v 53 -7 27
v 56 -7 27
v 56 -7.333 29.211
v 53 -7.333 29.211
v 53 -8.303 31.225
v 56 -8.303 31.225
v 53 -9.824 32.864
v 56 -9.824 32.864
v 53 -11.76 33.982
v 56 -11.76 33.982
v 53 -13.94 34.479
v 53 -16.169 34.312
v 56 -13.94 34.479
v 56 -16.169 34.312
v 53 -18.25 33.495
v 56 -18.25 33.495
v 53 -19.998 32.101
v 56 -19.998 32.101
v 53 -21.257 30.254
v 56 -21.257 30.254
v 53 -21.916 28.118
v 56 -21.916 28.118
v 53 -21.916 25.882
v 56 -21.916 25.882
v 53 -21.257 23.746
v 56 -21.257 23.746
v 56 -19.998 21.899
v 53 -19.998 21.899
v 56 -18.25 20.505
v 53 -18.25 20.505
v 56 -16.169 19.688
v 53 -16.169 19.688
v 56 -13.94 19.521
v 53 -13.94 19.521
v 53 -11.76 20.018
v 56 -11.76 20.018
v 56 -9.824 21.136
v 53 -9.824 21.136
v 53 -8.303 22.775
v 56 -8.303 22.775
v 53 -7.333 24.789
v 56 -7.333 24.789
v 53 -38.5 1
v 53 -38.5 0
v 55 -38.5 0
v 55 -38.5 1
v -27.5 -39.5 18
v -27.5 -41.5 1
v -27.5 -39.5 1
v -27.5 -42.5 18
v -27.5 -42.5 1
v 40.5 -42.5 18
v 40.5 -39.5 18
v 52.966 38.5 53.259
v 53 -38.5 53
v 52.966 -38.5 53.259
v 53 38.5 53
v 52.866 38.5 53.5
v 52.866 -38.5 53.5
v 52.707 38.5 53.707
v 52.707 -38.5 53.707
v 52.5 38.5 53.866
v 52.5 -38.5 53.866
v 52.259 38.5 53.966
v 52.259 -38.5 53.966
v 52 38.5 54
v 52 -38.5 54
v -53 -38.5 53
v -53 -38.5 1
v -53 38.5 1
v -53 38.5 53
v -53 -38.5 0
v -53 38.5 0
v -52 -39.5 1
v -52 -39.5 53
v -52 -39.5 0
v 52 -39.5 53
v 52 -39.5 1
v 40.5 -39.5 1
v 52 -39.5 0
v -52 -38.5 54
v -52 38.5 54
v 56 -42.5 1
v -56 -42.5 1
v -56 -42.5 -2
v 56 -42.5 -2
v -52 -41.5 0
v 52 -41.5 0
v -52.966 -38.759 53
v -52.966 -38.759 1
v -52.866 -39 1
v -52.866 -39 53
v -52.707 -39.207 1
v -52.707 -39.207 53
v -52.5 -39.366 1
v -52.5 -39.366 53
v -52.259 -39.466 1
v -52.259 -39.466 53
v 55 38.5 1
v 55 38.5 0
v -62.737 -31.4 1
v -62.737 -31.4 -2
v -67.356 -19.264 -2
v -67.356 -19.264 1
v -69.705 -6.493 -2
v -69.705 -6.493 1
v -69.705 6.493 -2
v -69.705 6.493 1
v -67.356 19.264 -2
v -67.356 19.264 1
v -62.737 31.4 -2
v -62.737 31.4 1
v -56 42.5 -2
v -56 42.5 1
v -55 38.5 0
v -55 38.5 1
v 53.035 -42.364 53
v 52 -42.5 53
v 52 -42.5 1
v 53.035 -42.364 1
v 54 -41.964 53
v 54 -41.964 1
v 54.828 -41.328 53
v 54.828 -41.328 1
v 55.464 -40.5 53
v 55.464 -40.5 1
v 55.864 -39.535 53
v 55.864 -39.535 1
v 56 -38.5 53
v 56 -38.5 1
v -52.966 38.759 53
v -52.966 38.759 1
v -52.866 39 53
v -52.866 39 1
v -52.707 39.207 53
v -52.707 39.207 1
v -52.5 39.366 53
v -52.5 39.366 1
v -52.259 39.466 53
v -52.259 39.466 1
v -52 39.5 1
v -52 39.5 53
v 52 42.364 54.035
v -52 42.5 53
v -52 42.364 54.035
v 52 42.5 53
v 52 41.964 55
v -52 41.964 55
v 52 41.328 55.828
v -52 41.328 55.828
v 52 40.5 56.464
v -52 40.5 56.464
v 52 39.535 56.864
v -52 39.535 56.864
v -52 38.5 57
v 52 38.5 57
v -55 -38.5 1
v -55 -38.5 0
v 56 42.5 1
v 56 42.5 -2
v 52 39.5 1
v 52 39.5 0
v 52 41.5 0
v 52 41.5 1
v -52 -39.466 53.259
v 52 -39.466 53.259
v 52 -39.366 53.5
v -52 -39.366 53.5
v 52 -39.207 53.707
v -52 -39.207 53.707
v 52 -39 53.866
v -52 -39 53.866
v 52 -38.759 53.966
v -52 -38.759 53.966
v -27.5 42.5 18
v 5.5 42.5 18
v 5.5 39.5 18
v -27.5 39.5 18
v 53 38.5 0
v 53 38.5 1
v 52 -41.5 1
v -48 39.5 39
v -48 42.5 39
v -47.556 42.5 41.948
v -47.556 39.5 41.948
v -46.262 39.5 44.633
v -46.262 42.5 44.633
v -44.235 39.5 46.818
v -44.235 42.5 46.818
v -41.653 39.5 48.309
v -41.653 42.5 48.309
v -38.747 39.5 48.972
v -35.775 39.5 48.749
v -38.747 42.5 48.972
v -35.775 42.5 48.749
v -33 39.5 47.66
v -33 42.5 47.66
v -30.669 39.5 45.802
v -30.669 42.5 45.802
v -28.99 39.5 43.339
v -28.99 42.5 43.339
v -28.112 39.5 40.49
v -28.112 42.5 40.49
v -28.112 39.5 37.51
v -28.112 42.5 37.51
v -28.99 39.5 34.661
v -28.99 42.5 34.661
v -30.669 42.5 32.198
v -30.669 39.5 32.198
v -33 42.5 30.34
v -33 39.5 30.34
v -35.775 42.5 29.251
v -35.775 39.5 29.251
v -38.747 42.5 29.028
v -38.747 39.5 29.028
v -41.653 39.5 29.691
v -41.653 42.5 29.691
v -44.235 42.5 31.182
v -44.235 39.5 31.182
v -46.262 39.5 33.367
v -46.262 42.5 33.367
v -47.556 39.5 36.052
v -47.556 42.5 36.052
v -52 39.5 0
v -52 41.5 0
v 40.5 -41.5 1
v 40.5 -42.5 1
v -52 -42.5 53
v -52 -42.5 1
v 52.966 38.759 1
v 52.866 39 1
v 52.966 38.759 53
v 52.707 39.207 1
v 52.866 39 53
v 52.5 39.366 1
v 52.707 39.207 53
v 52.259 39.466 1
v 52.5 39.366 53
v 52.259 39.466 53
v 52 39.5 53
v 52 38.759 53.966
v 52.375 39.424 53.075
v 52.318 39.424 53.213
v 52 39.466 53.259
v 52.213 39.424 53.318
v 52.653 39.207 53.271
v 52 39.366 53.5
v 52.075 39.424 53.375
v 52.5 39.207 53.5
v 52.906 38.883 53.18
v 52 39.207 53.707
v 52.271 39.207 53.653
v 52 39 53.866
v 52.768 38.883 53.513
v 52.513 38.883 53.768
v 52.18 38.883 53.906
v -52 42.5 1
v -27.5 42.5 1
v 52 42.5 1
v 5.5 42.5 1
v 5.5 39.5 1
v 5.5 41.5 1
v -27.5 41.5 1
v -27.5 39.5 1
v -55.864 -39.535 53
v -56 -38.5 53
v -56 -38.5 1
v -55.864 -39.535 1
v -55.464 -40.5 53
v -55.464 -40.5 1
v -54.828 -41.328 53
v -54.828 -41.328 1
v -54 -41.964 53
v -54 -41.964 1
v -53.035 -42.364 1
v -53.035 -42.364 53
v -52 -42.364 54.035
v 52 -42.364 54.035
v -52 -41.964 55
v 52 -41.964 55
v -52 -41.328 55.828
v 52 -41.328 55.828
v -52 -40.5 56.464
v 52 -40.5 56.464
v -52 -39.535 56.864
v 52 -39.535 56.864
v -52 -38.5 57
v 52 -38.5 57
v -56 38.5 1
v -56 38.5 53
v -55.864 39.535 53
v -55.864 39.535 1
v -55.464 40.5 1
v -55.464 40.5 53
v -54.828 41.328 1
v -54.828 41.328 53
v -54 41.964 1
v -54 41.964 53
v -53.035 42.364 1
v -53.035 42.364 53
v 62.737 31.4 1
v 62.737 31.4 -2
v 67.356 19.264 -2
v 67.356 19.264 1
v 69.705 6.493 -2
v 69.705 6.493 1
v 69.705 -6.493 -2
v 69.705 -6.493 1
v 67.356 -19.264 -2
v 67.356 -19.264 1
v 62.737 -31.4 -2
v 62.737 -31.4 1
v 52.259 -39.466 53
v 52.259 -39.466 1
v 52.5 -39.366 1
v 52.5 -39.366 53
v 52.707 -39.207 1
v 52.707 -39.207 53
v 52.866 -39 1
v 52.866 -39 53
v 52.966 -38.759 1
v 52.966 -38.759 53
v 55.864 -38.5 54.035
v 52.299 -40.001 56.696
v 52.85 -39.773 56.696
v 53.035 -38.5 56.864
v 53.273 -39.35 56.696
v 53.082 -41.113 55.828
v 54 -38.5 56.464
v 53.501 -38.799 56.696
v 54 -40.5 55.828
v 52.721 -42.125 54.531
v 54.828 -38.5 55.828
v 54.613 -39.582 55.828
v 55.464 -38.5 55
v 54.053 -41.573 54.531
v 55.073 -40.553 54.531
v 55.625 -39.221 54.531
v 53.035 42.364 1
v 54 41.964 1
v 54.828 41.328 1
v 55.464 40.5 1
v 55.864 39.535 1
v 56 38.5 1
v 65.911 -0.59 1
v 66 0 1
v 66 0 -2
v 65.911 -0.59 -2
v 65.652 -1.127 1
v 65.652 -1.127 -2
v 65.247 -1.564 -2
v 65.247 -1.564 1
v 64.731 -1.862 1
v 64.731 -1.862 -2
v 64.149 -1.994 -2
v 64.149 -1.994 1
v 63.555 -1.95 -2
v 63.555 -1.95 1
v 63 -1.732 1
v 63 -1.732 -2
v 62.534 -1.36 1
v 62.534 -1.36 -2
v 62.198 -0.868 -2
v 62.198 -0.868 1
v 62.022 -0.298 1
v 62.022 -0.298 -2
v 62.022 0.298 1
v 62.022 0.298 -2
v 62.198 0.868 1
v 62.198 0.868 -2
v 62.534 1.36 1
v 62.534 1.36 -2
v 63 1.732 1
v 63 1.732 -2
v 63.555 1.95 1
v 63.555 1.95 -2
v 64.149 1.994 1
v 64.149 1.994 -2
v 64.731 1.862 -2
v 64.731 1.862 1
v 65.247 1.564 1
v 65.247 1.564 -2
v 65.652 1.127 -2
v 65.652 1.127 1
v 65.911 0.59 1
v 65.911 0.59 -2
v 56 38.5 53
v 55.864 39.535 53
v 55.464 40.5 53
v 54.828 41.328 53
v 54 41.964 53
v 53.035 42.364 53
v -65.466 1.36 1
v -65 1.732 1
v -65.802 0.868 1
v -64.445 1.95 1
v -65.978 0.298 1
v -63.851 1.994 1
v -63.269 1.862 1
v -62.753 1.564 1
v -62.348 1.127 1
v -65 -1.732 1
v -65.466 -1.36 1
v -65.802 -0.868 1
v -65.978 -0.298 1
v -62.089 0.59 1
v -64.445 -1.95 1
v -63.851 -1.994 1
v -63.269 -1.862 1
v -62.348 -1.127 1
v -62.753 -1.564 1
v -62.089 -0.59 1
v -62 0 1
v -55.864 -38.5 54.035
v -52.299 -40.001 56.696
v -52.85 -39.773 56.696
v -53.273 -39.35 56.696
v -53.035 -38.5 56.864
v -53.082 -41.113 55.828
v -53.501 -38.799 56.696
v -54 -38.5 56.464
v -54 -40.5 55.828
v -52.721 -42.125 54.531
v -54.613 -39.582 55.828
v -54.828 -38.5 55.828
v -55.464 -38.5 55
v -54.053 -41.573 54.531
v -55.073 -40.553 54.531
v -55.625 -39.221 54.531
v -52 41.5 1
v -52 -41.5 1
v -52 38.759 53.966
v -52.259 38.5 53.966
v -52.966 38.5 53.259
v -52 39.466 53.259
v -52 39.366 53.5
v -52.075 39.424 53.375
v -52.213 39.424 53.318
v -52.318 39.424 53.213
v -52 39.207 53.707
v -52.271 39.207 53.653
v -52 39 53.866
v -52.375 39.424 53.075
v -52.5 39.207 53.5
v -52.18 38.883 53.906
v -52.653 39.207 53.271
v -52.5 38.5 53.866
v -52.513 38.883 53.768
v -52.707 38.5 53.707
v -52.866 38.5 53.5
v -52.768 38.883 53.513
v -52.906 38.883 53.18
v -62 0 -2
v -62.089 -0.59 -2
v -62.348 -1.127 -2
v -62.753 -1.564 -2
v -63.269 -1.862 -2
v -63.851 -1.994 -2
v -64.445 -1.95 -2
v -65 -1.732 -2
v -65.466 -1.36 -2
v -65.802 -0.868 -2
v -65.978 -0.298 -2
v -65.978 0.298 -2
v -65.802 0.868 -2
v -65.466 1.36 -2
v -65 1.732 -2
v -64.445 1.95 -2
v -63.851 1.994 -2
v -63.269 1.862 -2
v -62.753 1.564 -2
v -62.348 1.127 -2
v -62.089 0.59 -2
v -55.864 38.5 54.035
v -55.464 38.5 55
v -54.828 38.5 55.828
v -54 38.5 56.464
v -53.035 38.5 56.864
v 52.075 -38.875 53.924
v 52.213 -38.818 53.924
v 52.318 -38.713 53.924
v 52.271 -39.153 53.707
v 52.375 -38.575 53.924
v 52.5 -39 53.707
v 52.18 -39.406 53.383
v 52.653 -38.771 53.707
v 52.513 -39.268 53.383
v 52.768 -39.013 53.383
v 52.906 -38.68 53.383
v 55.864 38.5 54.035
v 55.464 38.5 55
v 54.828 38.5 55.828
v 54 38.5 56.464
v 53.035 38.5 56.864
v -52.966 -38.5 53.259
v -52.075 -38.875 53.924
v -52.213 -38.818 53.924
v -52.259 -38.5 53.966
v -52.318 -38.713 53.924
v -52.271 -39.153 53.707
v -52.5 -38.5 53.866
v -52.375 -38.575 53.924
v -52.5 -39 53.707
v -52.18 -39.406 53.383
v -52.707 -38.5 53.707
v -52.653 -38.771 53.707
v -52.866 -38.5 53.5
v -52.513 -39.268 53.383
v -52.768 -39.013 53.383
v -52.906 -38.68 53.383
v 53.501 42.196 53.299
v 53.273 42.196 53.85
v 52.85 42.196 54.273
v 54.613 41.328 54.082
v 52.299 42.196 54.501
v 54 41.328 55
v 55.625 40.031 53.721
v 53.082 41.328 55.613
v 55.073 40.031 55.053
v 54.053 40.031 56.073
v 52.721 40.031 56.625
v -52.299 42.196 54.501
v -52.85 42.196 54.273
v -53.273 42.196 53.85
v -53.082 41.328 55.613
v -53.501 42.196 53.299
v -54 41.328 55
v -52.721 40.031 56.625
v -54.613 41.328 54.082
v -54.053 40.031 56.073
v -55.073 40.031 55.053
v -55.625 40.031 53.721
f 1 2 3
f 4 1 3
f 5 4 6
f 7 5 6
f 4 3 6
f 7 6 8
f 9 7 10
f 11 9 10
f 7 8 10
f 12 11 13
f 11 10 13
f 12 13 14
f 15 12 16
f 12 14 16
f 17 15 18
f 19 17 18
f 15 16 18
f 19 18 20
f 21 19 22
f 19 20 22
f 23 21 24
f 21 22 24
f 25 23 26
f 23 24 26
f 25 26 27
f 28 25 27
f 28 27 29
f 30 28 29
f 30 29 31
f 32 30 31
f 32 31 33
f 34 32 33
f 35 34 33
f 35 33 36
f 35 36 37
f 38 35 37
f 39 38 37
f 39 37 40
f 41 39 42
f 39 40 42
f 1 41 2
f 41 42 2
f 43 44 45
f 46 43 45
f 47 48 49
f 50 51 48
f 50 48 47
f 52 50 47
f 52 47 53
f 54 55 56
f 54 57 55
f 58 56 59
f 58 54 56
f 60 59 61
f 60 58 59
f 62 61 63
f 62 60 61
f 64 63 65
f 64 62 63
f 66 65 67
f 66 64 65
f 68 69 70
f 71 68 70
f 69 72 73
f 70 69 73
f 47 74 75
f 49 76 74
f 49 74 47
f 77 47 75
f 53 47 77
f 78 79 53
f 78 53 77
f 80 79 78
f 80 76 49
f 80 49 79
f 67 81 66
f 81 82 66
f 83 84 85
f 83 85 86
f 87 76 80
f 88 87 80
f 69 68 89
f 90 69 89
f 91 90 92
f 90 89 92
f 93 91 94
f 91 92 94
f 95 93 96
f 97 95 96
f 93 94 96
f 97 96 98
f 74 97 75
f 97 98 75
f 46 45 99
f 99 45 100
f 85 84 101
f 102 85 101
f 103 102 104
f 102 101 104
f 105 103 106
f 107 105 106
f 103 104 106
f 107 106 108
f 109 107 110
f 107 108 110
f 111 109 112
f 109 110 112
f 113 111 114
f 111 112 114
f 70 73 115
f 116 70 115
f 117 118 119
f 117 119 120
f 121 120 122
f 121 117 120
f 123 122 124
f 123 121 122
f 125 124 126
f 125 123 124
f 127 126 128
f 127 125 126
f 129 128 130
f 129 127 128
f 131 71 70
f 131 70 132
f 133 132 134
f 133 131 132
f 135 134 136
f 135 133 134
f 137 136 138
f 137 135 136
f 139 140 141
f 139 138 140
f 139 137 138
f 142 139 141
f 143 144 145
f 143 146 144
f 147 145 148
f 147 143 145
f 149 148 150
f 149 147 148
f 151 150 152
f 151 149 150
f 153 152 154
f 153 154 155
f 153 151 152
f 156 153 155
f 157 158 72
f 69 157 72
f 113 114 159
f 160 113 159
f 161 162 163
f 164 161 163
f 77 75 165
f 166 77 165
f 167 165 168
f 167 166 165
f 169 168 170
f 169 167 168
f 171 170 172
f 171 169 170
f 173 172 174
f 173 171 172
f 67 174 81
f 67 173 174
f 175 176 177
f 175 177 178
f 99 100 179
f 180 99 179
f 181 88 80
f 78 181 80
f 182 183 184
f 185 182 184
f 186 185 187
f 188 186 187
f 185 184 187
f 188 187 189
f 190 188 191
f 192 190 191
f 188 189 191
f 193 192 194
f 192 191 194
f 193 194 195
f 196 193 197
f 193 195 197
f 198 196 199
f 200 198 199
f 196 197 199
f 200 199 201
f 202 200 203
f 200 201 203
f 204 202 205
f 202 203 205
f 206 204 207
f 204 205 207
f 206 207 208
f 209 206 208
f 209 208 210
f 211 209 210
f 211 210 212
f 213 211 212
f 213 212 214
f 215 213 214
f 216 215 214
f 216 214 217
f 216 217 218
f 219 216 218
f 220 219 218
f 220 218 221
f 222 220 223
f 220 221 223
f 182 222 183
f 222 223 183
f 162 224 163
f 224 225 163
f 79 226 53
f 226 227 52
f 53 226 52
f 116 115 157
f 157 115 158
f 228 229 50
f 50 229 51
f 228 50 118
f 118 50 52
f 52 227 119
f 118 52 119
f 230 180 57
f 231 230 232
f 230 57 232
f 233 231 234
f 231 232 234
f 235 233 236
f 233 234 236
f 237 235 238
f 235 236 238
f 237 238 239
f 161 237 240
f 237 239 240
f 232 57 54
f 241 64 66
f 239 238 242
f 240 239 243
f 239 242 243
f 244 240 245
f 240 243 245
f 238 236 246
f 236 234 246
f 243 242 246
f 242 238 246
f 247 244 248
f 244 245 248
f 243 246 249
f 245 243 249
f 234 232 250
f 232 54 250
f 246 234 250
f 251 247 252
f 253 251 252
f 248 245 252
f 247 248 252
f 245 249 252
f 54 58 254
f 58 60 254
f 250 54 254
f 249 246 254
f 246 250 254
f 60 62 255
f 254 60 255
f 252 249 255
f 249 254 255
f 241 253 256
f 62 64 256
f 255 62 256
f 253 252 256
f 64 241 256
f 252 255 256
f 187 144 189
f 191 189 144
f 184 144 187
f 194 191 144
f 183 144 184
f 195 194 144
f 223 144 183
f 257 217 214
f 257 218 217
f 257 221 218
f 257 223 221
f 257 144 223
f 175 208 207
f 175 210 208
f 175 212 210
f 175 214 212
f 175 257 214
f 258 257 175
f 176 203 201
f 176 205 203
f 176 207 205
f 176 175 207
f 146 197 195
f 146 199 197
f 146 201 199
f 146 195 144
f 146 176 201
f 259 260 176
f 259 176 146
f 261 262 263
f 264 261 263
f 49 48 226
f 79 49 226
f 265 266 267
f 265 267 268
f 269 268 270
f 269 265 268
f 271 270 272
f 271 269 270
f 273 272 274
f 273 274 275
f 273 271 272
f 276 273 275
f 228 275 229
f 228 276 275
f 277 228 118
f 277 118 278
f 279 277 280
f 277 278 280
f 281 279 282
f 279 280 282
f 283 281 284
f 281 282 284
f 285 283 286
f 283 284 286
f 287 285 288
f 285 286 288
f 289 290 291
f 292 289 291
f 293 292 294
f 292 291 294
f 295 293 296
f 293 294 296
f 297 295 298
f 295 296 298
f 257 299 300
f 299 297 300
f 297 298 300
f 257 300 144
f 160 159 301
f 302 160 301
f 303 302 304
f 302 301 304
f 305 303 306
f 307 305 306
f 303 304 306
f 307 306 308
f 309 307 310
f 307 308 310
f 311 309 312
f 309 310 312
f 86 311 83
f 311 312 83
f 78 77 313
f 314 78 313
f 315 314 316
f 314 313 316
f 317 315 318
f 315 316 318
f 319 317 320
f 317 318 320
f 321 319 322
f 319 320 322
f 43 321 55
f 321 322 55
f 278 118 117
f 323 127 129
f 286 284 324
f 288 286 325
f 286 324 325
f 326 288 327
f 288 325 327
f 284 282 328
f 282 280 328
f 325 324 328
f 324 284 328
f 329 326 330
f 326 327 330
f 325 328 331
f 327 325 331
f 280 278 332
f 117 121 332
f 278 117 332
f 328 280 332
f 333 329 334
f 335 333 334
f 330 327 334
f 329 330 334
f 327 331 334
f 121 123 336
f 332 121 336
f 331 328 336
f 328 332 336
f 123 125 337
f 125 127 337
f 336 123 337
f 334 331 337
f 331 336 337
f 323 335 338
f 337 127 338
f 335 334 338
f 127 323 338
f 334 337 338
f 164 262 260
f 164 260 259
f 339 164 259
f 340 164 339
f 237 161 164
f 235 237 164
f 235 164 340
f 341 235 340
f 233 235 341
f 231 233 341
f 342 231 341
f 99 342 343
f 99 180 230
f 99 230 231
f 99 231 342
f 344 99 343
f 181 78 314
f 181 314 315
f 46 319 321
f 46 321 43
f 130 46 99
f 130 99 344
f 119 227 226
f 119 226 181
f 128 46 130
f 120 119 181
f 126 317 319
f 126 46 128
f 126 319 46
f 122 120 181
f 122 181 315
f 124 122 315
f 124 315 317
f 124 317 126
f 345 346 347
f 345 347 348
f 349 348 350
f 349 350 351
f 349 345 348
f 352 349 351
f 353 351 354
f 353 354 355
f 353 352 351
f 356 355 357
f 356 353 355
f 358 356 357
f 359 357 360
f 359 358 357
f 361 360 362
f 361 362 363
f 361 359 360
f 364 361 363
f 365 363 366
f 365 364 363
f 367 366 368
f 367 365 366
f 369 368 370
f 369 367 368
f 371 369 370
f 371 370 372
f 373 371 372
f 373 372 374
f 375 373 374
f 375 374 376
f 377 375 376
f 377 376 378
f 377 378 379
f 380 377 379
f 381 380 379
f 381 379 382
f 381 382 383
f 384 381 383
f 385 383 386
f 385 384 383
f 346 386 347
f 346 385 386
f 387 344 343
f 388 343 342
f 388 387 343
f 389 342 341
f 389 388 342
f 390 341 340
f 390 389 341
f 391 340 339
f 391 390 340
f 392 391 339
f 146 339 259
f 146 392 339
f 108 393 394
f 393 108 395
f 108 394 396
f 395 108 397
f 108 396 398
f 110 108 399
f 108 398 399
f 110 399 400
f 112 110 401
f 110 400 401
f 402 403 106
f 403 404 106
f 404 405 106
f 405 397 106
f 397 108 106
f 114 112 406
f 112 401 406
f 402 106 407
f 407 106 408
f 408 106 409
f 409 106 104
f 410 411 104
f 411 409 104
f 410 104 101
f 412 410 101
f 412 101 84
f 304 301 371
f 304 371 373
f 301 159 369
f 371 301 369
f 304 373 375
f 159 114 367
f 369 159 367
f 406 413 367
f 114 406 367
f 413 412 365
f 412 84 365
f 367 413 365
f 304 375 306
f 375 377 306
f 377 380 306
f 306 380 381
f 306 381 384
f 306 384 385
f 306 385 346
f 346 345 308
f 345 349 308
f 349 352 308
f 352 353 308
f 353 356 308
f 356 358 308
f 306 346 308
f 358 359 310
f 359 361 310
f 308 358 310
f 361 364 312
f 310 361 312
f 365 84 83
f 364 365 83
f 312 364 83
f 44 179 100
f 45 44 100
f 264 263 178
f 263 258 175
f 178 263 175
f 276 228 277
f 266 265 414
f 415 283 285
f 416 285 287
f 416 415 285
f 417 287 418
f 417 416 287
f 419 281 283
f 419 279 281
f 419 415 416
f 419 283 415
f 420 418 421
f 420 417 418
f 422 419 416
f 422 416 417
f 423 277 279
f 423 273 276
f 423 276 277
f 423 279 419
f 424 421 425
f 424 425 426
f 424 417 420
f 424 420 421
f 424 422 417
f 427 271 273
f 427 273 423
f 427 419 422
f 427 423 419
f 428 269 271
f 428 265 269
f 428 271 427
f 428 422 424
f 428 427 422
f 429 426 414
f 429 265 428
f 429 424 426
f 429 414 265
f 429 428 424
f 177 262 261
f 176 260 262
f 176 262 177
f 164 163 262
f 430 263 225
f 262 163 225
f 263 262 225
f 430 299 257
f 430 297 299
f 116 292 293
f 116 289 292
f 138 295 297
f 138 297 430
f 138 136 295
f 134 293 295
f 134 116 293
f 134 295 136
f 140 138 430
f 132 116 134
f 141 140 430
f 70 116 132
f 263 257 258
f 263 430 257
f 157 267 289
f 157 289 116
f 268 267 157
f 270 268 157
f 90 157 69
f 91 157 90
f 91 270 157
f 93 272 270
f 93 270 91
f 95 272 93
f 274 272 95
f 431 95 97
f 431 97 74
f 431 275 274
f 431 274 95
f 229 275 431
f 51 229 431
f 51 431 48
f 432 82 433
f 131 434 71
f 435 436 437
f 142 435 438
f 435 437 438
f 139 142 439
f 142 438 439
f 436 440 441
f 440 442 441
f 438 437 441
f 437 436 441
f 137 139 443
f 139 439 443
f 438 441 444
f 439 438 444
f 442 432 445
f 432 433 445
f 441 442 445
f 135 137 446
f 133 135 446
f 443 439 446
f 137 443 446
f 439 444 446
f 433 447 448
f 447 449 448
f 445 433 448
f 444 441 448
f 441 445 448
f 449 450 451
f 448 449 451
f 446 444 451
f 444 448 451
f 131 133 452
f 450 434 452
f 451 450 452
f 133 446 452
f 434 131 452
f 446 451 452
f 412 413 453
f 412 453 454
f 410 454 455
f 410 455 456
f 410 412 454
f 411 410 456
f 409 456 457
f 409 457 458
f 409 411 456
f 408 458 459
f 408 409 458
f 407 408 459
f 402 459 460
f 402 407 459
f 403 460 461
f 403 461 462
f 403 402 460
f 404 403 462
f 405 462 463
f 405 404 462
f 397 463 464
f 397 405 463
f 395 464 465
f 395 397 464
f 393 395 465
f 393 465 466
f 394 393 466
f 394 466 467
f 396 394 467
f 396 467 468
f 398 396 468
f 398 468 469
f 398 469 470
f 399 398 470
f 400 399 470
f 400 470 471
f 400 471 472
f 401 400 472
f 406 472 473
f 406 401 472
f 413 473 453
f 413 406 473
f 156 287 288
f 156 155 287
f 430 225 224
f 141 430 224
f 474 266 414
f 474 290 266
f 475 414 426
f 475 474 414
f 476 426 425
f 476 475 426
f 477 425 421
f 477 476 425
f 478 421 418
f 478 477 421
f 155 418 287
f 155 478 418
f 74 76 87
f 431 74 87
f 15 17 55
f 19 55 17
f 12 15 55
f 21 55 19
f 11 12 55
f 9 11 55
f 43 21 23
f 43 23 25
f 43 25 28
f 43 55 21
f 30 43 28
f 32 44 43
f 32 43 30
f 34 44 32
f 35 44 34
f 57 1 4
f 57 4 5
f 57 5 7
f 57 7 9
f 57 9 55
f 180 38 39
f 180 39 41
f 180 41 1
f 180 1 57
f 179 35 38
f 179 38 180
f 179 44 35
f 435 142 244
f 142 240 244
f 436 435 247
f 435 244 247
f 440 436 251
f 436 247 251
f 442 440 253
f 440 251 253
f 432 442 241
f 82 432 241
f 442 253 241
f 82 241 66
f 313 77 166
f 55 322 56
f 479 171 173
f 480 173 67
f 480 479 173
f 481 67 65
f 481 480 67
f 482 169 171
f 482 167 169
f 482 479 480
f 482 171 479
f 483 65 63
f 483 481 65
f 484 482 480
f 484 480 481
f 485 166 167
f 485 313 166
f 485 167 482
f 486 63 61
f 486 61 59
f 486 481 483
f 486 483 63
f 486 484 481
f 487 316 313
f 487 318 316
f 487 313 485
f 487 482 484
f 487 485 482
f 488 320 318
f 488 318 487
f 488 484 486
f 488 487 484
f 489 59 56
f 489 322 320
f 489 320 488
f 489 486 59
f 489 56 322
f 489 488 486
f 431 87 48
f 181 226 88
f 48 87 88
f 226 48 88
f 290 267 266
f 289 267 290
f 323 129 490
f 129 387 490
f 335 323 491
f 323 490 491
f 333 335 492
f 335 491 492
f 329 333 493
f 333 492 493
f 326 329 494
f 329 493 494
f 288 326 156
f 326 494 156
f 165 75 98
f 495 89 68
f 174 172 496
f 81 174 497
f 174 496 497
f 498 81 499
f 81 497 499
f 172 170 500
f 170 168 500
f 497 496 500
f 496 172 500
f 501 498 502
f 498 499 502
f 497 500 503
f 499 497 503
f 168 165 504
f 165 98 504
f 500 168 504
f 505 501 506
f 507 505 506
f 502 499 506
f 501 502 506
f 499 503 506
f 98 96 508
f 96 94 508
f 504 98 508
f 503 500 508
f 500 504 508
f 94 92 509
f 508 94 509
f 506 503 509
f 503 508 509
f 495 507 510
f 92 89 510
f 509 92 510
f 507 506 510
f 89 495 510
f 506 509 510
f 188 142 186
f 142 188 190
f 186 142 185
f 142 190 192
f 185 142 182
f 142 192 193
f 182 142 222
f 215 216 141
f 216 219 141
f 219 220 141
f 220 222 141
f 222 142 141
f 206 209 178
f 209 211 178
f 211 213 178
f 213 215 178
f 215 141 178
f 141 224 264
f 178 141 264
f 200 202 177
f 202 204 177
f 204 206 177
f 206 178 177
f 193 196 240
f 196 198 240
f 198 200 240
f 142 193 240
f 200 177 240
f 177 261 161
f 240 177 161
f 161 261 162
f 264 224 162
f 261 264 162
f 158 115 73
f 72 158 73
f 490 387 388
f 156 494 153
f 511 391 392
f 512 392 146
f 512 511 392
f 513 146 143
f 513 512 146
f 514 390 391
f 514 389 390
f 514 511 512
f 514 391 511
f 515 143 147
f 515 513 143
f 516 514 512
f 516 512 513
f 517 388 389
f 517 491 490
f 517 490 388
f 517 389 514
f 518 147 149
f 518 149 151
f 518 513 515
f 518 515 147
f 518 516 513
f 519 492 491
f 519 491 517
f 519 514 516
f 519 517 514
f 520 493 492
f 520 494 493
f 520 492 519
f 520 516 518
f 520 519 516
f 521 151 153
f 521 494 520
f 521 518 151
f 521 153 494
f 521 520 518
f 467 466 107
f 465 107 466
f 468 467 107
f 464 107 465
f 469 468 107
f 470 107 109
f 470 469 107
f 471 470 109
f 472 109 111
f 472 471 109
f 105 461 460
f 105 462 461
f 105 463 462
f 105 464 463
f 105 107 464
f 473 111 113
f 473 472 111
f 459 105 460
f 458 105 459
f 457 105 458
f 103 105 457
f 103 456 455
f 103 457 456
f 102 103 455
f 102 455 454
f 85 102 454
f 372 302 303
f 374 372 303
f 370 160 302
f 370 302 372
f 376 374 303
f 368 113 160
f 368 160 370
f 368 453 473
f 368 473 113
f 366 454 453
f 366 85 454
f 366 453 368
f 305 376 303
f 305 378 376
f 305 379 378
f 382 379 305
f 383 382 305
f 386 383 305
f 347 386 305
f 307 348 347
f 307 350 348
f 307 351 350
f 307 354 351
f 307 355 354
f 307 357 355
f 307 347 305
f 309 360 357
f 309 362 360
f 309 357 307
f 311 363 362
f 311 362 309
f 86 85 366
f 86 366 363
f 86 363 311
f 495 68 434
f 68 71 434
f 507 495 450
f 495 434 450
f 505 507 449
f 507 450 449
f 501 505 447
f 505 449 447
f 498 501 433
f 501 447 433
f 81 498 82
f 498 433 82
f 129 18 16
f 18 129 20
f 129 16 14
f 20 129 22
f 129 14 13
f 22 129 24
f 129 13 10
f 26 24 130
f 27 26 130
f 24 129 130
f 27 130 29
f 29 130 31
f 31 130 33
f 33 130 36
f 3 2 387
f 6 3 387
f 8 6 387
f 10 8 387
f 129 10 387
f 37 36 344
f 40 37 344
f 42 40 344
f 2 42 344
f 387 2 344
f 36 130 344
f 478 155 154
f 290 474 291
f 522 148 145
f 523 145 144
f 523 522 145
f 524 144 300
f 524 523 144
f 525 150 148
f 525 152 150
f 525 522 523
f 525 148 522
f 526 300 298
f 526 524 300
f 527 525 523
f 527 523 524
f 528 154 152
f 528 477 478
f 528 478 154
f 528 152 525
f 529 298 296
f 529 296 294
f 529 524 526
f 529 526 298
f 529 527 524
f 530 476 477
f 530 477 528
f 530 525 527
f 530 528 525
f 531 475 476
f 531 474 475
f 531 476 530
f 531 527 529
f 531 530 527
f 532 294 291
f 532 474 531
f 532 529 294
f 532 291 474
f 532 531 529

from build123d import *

# Parameters (mm, degrees)
F0_W      = 112
F0_H      = 85
F1_DEPTH  = 57
F2_R      = 4
F3_T      = -3
F4_W      = 129.328548
F4_H      = 101.21753
F5_DEPTH  = 1
F6_W      = 112
F6_H      = 85
F6_R      = 2
F7_DEPTH  = 3
F8_W      = 68
F8_H      = 17
F9_DEPTH  = 3
F10_W     = 33
F10_H     = 17
F11_DEPTH = 3
F12_R     = 10
F13_DEPTH = 3
F14_R     = 7.5
F15_DEPTH = 3


with BuildPart() as f1:
    # F0 (on Top) → F1 (new body)
    with BuildSketch(Plane.XY):
        Rectangle(F0_W, F0_H)
    extrude(amount=F1_DEPTH)

    # F2
    f2_edges = [f1.edges().sort_by_distance(p)[0] for p in [
        (56, -42.5, 28.5),
        (-56, -42.5, 28.5),
        (0, -42.5, 57),
        (-56, 0, 57),
        (56, 0, 57),
        (56, 42.5, 28.5),
        (0, 42.5, 57),
        (-56, 42.5, 28.5),
    ]]
    fillet(f2_edges, radius=F2_R)

    # F3
    f3_openings = [f1.faces().sort_by_distance(p)[0] for p in [
        (0, 0, 0),
    ]]
    offset(amount=F3_T, openings=f3_openings)

    # F4 (on face) → F5 (cut)
    with BuildSketch(Plane(origin=(0, 0, 0), x_dir=(1, 0, 0), z_dir=(0, 0, -1))):
        Rectangle(F4_W, F4_H)
        Polygon((52, -38.5), (52, -41.5), (-52, -41.5), (-52, -38.5), (-55, -38.5), (-55, 38.5), (-53, 38.5), (-52, 38.5), (-52, 41.5), (52, 41.5), (52, 38.5), (55, 38.5), (55, -38.5), align=None, mode=Mode.SUBTRACT)
    extrude(amount=-F5_DEPTH, mode=Mode.SUBTRACT)

    # F8 (on face) → F9 (cut)
    with BuildSketch(Plane.XZ.offset(42.5)):
        with Locations((6.5, 9.5)):
            Rectangle(F8_W, F8_H)
    extrude(amount=-F9_DEPTH, mode=Mode.SUBTRACT)

    # F10 (on face) → F11 (cut)
    with BuildSketch(Plane(origin=(0, 42.5, 0), x_dir=(-1, 0, 0), z_dir=(0, 1, 0))):
        with Locations((11, 9.5)):
            Rectangle(F10_W, F10_H)
    extrude(amount=-F11_DEPTH, mode=Mode.SUBTRACT)

    # F12 (on face) → F13 (cut)
    with BuildSketch(Plane(origin=(0, 42.5, 0), x_dir=(-1, 0, 0), z_dir=(0, 1, 0))):
        with Locations((38, 39)):
            Circle(F12_R)
    extrude(amount=-F13_DEPTH, mode=Mode.SUBTRACT)

    # F14 (on face) → F15 (cut)
    with BuildSketch(Plane.YZ.offset(56)):
        with Locations((-14.5, 27)):
            Circle(F14_R)
    extrude(amount=-F15_DEPTH, mode=Mode.SUBTRACT)


with BuildPart() as f7:
    # F6 (on face) → F7 (new body)
    with BuildSketch(Plane(origin=(0, 0, 1), x_dir=(1, 0, 0), z_dir=(0, 0, -1))):
        Rectangle(F6_W, F6_H)
        with BuildLine():
            ThreePointArc((56, -42.5), (70, 0), (56, 42.5))
            Line((56, 42.5), (56, -42.5))
        make_face()
        with Locations((64, 0)):
            Circle(F6_R, mode=Mode.SUBTRACT)
        with BuildLine():
            Line((-56, -42.5), (-56, 42.5))
            ThreePointArc((-56, 42.5), (-70, 0), (-56, -42.5))
        make_face()
        with Locations((-64, 0)):
            Circle(F6_R, mode=Mode.SUBTRACT)
    extrude(amount=F7_DEPTH)


solid = Compound([f1.part, f7.part])
